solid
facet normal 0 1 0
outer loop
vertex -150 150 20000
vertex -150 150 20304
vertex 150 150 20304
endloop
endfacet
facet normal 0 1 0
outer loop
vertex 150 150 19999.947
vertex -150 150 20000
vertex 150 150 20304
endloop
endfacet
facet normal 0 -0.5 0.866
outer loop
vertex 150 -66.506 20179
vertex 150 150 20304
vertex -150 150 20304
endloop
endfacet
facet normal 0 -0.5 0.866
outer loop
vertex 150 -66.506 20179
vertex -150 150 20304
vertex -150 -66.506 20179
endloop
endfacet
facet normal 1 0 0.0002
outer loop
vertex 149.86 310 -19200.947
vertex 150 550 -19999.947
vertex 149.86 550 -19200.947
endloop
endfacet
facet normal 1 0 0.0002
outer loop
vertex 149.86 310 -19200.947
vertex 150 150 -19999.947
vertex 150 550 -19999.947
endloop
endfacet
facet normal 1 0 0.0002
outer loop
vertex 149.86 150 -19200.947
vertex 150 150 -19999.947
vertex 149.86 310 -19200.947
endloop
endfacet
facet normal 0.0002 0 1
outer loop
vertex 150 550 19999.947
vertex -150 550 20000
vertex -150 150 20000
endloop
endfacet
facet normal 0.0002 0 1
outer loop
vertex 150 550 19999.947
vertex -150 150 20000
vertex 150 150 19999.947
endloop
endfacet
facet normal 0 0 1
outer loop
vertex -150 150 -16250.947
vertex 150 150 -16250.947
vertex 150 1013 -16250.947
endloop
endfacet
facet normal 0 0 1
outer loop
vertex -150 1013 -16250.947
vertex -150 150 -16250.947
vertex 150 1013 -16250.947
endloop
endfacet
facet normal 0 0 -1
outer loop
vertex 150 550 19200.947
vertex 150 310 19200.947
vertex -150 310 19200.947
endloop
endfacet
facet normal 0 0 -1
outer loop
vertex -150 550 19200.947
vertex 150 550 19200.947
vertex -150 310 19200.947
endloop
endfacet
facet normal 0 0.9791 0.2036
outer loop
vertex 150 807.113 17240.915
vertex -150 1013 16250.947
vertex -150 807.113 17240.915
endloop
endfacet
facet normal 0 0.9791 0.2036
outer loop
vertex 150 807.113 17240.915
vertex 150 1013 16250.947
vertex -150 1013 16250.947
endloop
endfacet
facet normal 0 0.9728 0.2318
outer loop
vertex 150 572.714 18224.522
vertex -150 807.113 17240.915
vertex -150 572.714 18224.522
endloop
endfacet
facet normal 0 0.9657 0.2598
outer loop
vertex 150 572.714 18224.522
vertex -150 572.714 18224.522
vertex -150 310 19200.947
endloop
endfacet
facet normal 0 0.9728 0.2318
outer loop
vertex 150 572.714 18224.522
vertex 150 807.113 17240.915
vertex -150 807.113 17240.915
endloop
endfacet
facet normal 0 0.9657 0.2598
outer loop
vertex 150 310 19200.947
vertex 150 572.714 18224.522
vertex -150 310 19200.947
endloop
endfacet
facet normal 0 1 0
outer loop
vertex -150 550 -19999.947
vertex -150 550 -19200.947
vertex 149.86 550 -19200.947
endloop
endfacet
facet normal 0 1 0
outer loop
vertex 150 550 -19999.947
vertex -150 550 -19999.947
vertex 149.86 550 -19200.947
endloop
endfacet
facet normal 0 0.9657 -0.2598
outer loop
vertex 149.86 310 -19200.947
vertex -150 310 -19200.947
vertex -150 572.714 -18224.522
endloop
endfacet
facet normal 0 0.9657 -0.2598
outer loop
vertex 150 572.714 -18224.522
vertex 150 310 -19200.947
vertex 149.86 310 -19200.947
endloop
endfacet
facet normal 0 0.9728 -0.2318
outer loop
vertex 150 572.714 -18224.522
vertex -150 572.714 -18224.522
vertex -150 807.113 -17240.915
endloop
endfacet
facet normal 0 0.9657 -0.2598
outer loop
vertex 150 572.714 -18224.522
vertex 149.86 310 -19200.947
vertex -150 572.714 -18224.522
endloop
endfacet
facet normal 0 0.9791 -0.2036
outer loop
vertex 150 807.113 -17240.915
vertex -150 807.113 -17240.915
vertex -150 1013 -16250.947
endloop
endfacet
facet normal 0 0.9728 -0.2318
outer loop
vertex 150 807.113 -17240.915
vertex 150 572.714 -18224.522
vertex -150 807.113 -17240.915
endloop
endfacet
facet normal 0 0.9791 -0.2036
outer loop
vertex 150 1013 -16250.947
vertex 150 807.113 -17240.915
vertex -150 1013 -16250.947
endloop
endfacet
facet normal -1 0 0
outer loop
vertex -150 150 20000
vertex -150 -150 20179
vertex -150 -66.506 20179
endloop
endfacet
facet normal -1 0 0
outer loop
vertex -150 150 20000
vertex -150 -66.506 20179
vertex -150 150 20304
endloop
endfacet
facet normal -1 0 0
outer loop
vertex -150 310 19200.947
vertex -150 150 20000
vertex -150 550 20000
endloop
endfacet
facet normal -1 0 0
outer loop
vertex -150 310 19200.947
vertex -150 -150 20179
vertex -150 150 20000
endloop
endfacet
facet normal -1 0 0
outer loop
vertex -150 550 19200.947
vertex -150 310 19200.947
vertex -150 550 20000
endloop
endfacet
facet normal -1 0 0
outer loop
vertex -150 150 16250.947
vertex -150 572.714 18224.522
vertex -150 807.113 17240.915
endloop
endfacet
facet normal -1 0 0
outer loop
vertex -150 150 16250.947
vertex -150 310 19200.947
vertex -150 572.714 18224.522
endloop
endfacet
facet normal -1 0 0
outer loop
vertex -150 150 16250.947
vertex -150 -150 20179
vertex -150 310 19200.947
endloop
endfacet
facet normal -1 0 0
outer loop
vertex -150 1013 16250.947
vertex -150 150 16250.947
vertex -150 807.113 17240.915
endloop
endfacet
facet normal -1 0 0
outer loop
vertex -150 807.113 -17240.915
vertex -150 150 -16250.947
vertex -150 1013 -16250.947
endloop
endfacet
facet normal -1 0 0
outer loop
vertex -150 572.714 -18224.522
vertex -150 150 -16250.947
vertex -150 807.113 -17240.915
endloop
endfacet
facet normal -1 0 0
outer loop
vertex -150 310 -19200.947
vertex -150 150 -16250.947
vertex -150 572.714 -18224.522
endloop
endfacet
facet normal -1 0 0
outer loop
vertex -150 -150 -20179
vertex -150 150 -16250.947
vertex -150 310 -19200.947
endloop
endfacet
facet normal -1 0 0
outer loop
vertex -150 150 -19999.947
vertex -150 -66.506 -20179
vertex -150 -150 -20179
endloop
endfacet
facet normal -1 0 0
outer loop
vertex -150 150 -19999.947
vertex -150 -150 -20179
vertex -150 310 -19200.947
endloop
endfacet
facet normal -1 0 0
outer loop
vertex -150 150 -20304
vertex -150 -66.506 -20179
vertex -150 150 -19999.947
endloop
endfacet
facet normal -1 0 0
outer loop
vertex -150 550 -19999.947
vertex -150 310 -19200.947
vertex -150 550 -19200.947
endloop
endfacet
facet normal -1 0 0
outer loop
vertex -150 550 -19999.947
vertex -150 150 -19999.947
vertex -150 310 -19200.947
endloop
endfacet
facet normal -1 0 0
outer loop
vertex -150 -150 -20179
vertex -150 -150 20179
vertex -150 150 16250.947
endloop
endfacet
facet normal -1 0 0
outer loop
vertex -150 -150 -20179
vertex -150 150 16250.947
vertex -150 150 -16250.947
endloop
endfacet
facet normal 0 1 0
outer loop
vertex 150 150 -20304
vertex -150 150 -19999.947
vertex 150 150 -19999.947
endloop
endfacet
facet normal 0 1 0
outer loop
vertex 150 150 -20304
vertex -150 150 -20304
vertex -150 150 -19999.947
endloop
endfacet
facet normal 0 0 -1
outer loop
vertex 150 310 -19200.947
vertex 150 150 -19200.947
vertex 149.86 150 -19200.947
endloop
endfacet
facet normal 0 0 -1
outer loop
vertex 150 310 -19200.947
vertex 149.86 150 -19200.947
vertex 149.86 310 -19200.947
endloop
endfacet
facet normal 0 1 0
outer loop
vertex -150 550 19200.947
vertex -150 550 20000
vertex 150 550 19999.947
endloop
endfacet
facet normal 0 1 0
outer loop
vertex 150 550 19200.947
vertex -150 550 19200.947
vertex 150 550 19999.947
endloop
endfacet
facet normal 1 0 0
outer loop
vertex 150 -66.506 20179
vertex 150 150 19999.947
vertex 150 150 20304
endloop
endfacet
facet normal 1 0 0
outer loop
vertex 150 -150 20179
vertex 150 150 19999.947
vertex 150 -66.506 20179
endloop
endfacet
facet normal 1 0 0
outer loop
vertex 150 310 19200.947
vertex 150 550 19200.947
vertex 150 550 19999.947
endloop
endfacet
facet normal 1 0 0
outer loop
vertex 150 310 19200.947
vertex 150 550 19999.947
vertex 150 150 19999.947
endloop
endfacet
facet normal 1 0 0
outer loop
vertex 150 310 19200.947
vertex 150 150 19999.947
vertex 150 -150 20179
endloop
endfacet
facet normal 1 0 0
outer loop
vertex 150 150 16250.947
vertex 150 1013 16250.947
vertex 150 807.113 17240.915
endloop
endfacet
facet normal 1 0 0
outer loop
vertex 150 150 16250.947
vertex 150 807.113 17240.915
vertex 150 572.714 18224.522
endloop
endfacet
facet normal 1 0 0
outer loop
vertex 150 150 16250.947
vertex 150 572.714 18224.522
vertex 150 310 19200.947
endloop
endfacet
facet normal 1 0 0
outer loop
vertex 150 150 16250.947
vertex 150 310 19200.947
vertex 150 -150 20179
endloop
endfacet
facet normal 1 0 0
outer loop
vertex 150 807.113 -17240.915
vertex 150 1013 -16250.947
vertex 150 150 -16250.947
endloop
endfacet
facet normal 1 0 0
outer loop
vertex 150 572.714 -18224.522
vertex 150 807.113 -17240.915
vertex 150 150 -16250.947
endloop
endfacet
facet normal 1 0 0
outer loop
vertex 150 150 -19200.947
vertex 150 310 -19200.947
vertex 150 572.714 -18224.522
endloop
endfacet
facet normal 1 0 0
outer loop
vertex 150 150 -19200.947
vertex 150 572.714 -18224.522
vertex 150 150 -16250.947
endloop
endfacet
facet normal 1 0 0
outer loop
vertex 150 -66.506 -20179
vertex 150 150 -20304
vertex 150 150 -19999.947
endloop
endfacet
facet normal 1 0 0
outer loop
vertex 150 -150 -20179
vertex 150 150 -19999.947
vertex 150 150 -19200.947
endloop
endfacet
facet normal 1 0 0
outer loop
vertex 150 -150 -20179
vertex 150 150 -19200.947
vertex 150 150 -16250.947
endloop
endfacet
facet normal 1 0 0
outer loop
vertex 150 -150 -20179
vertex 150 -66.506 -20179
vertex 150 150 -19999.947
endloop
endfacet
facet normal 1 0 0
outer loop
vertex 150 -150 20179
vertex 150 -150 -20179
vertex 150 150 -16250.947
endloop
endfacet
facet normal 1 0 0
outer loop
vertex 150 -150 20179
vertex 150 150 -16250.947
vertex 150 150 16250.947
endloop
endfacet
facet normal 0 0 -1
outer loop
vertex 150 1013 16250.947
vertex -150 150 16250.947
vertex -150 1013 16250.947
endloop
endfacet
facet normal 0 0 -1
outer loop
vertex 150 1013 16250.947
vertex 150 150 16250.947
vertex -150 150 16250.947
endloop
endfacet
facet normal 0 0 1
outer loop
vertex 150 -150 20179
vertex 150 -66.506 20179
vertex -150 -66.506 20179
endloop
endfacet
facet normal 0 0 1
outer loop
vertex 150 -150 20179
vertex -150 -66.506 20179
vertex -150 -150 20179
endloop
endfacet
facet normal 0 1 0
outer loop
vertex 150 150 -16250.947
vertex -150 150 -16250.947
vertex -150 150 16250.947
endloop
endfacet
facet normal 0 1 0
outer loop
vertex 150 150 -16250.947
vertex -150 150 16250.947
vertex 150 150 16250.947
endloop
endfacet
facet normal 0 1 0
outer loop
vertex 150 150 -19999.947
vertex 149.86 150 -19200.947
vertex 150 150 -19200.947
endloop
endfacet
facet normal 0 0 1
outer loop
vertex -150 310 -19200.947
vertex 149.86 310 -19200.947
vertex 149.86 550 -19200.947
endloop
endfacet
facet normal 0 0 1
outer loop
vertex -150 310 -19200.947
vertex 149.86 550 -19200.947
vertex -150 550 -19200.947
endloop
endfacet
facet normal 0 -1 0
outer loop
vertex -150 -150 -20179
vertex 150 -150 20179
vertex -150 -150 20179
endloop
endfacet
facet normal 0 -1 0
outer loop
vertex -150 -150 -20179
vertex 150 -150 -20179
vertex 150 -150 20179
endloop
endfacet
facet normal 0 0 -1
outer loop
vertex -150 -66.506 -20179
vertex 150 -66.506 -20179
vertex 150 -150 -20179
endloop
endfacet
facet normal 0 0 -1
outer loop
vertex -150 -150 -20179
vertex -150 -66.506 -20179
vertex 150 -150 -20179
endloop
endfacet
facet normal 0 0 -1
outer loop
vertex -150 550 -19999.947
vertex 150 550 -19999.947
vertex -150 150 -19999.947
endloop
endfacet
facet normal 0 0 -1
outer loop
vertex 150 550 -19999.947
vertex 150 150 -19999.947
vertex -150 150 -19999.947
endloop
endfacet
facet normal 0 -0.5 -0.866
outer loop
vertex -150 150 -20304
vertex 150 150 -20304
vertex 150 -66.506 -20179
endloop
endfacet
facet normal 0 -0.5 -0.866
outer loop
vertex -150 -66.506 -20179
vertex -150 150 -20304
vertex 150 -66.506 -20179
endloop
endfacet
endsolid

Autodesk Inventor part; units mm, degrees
ref_plane "YZ Plane" through (0, 0, 0) normal (1, 0, 0) x (0, 1, 0)
ref_plane "XZ Plane" through (0, 0, 0) normal (0, 1, 0) x (-1, 0, 0)
ref_plane "XY Plane" through (0, 0, 0) normal (0, 0, 1) x (1, 0, 0)
sketch "Sketch1" plane through (0, 0, 0) normal (0, 0, 1) x (1, 0, 0)
  point P0 (0, 0)
sketch "Sketch2" plane through (0, 0, 0) normal (0, 0, 1) x (1, 0, 0)
  line L0 (-150, 150) -> (150, 150)
  line L1 (150, 150) -> (150, -150)
  line L2 (150, -150) -> (-150, -150)
  line L3 (-150, -150) -> (-150, 150)
  line L4 (-150, 150) -> (150, -150) construction
  line L5 (150, 150) -> (-150, -150) construction
  point P0 (0, 0)
  dimension "d0" = 300
  dimension "d1" = 300
extrude "Extrusion1" add sketch "Sketch2" along normal mid plane 38608
sketch "Sketch4" plane through (150, 150, 19304) normal (1, 0, 0) x (0, 0, -1)
  point P0 (19304, -150)
sketch "Sketch5" plane through (-150, 150, 19304) normal (0, 1, 0) x (1, 0, 0)
  point P0 (150, 19304)
sketch "Sketch6" plane through (150, 150, 19304) normal (1, 0, 0) x (0, 0, -1)
  line L0 (38608, 0) -> (0, 0) projected
  line L1 (0, -300) -> (0, 0)
  line L2 (0, 0) -> (-1000, 0)
  line L3 (-1000, 0) -> (-875, -216.5064)
  line L4 (-875, -216.5064) -> (-695.9473, -300)
  line L5 (-695.9473, -300) -> (0, -300)
  line L6 (38608, -300) -> (38608, 0)
  line L7 (38608, 0) -> (39608, 0)
  line L8 (39608, 0) -> (39483, -216.5064)
  line L9 (39483, -216.5064) -> (39303.9473, -300)
  line L10 (39303.9473, -300) -> (38608, -300)
  point P0 (19304, -150)
  dimension "d10" = 1000
  dimension "d11" = 250
  dimension "d12" = 60
  dimension "d13" = 145
extrude "Extrusion3" add sketch "Sketch6" against normal blind 300
sketch "Sketch7" plane through (150, 150, 20304) normal (1, 0, 0) x (0, 0, -1)
  line L0 (40303.9473, -300) -> (304.0527, -300) projected
  point P0 (20304, -150)
sketch "Sketch8" plane through (-150, 150, 20304) normal (0, 1, 0) x (1, 0, 0)
  line L0 (0, 40608) -> (0, 0) projected
  line L1 (0, 0) -> (0, 304)
  line L2 (300, 40303.9473) -> (300, 304.0527) projected
  line L3 (0, 304) -> (300, 304.0527)
  line L4 (300, 304.0527) -> (300, 1103.0527)
  line L5 (300, 1103.0527) -> (0, 1103.0527)
  line L6 (0, 1103.0527) -> (0, 304)
  line L7 (0, 40608) -> (0, 40304)
  line L8 (300, 40303.9473) -> (0, 40303.9473) projected
  line L9 (0, 40304) -> (300, 40303.9473)
  line L10 (300, 40303.9473) -> (299.8596, 39504.9473)
  line L11 (299.8596, 39504.9473) -> (0, 39504.9473)
  line L12 (0, 40303.9473) -> (0, 39504.9473)
  line L13 (0, 304.0527) -> (0, 40303.9473) projected
  point P0 (150, 20304)
  point P1 (0, 1103.0527)
  dimension "d16" = 304
  dimension "d17" = 799
  dimension "d18" = 304
  dimension "d19" = 799
  dimension "d20" = 90
extrude "Extrusion4" add sketch "Sketch8" along normal blind 400 contours L8 L10 L11 L0 | L2 L3 L0 L5
sketch "Sketch9" plane through (150, -150, 19999.9473) normal (1, 0, 0) x (0, 0, -1)
  line L0 (0, 0) -> (-179.0527, 83.4936) projected
  line L1 (-179.0527, 83.4936) -> (-179.0527, 0)
  line L2 (-179.0527, 0) -> (0, 0)
  line L3 (0, 0) -> (-179.0527, 83.4936)
  line L4 (0, 0) -> (39999.8946, 0) projected
  line L5 (40178.9473, 83.4936) -> (40303.9473, 300) projected
  line L6 (39999.8946, 0) -> (40178.9473, 83.4936)
  line L7 (40178.9473, 83.4936) -> (40178.9473, 0)
  line L8 (40178.9473, 0) -> (39999.8946, 0)
  point P0 (19999.9473, 150)
extrude "Extrusion5" add sketch "Sketch9" against normal blind 300
sketch "Sketch11" plane through (150, 150, 19200.9473) normal (1, 0, 0) x (0, 0, -1)
  line L0 (39200.8946, 0) -> (0, 0) projected
  line L1 (0, 0) -> (2950, 0)
  line L2 (0, 0) -> (0, 160)
  line L3 (0, 0) -> (0, 400) projected
  line L4 (2950, 0) -> (2950, 863)
  line L5 (2950, 0) -> (3813, 0) construction
  arc A0 (2950, 863) -> (0, 160) centre (9580.862, -33503.1413) ccw
  line L6 (19200.9473, -150) -> (19200.9473, 2504.8951)
  line L7 (-799, 0) -> (38401.8946, 0)
  line L8 (38401.8946, 0) -> (38401.8946, 160)
  line L9 (35451.8946, 0) -> (35451.8946, 863)
  arc A1 (38401.8946, 160) -> (35451.8946, 863) centre (28821.0326, -33503.1413) ccw
  dimension "d25" = 2950
  dimension "d27" = 160
  dimension "d28" = 863
  dimension "d29" = 90
  dimension "d30" = 35000
extrude "Extrusion6" add sketch "Sketch11" against normal blind 300
properties part number "main_crossbeam" material "Wood Shake"
